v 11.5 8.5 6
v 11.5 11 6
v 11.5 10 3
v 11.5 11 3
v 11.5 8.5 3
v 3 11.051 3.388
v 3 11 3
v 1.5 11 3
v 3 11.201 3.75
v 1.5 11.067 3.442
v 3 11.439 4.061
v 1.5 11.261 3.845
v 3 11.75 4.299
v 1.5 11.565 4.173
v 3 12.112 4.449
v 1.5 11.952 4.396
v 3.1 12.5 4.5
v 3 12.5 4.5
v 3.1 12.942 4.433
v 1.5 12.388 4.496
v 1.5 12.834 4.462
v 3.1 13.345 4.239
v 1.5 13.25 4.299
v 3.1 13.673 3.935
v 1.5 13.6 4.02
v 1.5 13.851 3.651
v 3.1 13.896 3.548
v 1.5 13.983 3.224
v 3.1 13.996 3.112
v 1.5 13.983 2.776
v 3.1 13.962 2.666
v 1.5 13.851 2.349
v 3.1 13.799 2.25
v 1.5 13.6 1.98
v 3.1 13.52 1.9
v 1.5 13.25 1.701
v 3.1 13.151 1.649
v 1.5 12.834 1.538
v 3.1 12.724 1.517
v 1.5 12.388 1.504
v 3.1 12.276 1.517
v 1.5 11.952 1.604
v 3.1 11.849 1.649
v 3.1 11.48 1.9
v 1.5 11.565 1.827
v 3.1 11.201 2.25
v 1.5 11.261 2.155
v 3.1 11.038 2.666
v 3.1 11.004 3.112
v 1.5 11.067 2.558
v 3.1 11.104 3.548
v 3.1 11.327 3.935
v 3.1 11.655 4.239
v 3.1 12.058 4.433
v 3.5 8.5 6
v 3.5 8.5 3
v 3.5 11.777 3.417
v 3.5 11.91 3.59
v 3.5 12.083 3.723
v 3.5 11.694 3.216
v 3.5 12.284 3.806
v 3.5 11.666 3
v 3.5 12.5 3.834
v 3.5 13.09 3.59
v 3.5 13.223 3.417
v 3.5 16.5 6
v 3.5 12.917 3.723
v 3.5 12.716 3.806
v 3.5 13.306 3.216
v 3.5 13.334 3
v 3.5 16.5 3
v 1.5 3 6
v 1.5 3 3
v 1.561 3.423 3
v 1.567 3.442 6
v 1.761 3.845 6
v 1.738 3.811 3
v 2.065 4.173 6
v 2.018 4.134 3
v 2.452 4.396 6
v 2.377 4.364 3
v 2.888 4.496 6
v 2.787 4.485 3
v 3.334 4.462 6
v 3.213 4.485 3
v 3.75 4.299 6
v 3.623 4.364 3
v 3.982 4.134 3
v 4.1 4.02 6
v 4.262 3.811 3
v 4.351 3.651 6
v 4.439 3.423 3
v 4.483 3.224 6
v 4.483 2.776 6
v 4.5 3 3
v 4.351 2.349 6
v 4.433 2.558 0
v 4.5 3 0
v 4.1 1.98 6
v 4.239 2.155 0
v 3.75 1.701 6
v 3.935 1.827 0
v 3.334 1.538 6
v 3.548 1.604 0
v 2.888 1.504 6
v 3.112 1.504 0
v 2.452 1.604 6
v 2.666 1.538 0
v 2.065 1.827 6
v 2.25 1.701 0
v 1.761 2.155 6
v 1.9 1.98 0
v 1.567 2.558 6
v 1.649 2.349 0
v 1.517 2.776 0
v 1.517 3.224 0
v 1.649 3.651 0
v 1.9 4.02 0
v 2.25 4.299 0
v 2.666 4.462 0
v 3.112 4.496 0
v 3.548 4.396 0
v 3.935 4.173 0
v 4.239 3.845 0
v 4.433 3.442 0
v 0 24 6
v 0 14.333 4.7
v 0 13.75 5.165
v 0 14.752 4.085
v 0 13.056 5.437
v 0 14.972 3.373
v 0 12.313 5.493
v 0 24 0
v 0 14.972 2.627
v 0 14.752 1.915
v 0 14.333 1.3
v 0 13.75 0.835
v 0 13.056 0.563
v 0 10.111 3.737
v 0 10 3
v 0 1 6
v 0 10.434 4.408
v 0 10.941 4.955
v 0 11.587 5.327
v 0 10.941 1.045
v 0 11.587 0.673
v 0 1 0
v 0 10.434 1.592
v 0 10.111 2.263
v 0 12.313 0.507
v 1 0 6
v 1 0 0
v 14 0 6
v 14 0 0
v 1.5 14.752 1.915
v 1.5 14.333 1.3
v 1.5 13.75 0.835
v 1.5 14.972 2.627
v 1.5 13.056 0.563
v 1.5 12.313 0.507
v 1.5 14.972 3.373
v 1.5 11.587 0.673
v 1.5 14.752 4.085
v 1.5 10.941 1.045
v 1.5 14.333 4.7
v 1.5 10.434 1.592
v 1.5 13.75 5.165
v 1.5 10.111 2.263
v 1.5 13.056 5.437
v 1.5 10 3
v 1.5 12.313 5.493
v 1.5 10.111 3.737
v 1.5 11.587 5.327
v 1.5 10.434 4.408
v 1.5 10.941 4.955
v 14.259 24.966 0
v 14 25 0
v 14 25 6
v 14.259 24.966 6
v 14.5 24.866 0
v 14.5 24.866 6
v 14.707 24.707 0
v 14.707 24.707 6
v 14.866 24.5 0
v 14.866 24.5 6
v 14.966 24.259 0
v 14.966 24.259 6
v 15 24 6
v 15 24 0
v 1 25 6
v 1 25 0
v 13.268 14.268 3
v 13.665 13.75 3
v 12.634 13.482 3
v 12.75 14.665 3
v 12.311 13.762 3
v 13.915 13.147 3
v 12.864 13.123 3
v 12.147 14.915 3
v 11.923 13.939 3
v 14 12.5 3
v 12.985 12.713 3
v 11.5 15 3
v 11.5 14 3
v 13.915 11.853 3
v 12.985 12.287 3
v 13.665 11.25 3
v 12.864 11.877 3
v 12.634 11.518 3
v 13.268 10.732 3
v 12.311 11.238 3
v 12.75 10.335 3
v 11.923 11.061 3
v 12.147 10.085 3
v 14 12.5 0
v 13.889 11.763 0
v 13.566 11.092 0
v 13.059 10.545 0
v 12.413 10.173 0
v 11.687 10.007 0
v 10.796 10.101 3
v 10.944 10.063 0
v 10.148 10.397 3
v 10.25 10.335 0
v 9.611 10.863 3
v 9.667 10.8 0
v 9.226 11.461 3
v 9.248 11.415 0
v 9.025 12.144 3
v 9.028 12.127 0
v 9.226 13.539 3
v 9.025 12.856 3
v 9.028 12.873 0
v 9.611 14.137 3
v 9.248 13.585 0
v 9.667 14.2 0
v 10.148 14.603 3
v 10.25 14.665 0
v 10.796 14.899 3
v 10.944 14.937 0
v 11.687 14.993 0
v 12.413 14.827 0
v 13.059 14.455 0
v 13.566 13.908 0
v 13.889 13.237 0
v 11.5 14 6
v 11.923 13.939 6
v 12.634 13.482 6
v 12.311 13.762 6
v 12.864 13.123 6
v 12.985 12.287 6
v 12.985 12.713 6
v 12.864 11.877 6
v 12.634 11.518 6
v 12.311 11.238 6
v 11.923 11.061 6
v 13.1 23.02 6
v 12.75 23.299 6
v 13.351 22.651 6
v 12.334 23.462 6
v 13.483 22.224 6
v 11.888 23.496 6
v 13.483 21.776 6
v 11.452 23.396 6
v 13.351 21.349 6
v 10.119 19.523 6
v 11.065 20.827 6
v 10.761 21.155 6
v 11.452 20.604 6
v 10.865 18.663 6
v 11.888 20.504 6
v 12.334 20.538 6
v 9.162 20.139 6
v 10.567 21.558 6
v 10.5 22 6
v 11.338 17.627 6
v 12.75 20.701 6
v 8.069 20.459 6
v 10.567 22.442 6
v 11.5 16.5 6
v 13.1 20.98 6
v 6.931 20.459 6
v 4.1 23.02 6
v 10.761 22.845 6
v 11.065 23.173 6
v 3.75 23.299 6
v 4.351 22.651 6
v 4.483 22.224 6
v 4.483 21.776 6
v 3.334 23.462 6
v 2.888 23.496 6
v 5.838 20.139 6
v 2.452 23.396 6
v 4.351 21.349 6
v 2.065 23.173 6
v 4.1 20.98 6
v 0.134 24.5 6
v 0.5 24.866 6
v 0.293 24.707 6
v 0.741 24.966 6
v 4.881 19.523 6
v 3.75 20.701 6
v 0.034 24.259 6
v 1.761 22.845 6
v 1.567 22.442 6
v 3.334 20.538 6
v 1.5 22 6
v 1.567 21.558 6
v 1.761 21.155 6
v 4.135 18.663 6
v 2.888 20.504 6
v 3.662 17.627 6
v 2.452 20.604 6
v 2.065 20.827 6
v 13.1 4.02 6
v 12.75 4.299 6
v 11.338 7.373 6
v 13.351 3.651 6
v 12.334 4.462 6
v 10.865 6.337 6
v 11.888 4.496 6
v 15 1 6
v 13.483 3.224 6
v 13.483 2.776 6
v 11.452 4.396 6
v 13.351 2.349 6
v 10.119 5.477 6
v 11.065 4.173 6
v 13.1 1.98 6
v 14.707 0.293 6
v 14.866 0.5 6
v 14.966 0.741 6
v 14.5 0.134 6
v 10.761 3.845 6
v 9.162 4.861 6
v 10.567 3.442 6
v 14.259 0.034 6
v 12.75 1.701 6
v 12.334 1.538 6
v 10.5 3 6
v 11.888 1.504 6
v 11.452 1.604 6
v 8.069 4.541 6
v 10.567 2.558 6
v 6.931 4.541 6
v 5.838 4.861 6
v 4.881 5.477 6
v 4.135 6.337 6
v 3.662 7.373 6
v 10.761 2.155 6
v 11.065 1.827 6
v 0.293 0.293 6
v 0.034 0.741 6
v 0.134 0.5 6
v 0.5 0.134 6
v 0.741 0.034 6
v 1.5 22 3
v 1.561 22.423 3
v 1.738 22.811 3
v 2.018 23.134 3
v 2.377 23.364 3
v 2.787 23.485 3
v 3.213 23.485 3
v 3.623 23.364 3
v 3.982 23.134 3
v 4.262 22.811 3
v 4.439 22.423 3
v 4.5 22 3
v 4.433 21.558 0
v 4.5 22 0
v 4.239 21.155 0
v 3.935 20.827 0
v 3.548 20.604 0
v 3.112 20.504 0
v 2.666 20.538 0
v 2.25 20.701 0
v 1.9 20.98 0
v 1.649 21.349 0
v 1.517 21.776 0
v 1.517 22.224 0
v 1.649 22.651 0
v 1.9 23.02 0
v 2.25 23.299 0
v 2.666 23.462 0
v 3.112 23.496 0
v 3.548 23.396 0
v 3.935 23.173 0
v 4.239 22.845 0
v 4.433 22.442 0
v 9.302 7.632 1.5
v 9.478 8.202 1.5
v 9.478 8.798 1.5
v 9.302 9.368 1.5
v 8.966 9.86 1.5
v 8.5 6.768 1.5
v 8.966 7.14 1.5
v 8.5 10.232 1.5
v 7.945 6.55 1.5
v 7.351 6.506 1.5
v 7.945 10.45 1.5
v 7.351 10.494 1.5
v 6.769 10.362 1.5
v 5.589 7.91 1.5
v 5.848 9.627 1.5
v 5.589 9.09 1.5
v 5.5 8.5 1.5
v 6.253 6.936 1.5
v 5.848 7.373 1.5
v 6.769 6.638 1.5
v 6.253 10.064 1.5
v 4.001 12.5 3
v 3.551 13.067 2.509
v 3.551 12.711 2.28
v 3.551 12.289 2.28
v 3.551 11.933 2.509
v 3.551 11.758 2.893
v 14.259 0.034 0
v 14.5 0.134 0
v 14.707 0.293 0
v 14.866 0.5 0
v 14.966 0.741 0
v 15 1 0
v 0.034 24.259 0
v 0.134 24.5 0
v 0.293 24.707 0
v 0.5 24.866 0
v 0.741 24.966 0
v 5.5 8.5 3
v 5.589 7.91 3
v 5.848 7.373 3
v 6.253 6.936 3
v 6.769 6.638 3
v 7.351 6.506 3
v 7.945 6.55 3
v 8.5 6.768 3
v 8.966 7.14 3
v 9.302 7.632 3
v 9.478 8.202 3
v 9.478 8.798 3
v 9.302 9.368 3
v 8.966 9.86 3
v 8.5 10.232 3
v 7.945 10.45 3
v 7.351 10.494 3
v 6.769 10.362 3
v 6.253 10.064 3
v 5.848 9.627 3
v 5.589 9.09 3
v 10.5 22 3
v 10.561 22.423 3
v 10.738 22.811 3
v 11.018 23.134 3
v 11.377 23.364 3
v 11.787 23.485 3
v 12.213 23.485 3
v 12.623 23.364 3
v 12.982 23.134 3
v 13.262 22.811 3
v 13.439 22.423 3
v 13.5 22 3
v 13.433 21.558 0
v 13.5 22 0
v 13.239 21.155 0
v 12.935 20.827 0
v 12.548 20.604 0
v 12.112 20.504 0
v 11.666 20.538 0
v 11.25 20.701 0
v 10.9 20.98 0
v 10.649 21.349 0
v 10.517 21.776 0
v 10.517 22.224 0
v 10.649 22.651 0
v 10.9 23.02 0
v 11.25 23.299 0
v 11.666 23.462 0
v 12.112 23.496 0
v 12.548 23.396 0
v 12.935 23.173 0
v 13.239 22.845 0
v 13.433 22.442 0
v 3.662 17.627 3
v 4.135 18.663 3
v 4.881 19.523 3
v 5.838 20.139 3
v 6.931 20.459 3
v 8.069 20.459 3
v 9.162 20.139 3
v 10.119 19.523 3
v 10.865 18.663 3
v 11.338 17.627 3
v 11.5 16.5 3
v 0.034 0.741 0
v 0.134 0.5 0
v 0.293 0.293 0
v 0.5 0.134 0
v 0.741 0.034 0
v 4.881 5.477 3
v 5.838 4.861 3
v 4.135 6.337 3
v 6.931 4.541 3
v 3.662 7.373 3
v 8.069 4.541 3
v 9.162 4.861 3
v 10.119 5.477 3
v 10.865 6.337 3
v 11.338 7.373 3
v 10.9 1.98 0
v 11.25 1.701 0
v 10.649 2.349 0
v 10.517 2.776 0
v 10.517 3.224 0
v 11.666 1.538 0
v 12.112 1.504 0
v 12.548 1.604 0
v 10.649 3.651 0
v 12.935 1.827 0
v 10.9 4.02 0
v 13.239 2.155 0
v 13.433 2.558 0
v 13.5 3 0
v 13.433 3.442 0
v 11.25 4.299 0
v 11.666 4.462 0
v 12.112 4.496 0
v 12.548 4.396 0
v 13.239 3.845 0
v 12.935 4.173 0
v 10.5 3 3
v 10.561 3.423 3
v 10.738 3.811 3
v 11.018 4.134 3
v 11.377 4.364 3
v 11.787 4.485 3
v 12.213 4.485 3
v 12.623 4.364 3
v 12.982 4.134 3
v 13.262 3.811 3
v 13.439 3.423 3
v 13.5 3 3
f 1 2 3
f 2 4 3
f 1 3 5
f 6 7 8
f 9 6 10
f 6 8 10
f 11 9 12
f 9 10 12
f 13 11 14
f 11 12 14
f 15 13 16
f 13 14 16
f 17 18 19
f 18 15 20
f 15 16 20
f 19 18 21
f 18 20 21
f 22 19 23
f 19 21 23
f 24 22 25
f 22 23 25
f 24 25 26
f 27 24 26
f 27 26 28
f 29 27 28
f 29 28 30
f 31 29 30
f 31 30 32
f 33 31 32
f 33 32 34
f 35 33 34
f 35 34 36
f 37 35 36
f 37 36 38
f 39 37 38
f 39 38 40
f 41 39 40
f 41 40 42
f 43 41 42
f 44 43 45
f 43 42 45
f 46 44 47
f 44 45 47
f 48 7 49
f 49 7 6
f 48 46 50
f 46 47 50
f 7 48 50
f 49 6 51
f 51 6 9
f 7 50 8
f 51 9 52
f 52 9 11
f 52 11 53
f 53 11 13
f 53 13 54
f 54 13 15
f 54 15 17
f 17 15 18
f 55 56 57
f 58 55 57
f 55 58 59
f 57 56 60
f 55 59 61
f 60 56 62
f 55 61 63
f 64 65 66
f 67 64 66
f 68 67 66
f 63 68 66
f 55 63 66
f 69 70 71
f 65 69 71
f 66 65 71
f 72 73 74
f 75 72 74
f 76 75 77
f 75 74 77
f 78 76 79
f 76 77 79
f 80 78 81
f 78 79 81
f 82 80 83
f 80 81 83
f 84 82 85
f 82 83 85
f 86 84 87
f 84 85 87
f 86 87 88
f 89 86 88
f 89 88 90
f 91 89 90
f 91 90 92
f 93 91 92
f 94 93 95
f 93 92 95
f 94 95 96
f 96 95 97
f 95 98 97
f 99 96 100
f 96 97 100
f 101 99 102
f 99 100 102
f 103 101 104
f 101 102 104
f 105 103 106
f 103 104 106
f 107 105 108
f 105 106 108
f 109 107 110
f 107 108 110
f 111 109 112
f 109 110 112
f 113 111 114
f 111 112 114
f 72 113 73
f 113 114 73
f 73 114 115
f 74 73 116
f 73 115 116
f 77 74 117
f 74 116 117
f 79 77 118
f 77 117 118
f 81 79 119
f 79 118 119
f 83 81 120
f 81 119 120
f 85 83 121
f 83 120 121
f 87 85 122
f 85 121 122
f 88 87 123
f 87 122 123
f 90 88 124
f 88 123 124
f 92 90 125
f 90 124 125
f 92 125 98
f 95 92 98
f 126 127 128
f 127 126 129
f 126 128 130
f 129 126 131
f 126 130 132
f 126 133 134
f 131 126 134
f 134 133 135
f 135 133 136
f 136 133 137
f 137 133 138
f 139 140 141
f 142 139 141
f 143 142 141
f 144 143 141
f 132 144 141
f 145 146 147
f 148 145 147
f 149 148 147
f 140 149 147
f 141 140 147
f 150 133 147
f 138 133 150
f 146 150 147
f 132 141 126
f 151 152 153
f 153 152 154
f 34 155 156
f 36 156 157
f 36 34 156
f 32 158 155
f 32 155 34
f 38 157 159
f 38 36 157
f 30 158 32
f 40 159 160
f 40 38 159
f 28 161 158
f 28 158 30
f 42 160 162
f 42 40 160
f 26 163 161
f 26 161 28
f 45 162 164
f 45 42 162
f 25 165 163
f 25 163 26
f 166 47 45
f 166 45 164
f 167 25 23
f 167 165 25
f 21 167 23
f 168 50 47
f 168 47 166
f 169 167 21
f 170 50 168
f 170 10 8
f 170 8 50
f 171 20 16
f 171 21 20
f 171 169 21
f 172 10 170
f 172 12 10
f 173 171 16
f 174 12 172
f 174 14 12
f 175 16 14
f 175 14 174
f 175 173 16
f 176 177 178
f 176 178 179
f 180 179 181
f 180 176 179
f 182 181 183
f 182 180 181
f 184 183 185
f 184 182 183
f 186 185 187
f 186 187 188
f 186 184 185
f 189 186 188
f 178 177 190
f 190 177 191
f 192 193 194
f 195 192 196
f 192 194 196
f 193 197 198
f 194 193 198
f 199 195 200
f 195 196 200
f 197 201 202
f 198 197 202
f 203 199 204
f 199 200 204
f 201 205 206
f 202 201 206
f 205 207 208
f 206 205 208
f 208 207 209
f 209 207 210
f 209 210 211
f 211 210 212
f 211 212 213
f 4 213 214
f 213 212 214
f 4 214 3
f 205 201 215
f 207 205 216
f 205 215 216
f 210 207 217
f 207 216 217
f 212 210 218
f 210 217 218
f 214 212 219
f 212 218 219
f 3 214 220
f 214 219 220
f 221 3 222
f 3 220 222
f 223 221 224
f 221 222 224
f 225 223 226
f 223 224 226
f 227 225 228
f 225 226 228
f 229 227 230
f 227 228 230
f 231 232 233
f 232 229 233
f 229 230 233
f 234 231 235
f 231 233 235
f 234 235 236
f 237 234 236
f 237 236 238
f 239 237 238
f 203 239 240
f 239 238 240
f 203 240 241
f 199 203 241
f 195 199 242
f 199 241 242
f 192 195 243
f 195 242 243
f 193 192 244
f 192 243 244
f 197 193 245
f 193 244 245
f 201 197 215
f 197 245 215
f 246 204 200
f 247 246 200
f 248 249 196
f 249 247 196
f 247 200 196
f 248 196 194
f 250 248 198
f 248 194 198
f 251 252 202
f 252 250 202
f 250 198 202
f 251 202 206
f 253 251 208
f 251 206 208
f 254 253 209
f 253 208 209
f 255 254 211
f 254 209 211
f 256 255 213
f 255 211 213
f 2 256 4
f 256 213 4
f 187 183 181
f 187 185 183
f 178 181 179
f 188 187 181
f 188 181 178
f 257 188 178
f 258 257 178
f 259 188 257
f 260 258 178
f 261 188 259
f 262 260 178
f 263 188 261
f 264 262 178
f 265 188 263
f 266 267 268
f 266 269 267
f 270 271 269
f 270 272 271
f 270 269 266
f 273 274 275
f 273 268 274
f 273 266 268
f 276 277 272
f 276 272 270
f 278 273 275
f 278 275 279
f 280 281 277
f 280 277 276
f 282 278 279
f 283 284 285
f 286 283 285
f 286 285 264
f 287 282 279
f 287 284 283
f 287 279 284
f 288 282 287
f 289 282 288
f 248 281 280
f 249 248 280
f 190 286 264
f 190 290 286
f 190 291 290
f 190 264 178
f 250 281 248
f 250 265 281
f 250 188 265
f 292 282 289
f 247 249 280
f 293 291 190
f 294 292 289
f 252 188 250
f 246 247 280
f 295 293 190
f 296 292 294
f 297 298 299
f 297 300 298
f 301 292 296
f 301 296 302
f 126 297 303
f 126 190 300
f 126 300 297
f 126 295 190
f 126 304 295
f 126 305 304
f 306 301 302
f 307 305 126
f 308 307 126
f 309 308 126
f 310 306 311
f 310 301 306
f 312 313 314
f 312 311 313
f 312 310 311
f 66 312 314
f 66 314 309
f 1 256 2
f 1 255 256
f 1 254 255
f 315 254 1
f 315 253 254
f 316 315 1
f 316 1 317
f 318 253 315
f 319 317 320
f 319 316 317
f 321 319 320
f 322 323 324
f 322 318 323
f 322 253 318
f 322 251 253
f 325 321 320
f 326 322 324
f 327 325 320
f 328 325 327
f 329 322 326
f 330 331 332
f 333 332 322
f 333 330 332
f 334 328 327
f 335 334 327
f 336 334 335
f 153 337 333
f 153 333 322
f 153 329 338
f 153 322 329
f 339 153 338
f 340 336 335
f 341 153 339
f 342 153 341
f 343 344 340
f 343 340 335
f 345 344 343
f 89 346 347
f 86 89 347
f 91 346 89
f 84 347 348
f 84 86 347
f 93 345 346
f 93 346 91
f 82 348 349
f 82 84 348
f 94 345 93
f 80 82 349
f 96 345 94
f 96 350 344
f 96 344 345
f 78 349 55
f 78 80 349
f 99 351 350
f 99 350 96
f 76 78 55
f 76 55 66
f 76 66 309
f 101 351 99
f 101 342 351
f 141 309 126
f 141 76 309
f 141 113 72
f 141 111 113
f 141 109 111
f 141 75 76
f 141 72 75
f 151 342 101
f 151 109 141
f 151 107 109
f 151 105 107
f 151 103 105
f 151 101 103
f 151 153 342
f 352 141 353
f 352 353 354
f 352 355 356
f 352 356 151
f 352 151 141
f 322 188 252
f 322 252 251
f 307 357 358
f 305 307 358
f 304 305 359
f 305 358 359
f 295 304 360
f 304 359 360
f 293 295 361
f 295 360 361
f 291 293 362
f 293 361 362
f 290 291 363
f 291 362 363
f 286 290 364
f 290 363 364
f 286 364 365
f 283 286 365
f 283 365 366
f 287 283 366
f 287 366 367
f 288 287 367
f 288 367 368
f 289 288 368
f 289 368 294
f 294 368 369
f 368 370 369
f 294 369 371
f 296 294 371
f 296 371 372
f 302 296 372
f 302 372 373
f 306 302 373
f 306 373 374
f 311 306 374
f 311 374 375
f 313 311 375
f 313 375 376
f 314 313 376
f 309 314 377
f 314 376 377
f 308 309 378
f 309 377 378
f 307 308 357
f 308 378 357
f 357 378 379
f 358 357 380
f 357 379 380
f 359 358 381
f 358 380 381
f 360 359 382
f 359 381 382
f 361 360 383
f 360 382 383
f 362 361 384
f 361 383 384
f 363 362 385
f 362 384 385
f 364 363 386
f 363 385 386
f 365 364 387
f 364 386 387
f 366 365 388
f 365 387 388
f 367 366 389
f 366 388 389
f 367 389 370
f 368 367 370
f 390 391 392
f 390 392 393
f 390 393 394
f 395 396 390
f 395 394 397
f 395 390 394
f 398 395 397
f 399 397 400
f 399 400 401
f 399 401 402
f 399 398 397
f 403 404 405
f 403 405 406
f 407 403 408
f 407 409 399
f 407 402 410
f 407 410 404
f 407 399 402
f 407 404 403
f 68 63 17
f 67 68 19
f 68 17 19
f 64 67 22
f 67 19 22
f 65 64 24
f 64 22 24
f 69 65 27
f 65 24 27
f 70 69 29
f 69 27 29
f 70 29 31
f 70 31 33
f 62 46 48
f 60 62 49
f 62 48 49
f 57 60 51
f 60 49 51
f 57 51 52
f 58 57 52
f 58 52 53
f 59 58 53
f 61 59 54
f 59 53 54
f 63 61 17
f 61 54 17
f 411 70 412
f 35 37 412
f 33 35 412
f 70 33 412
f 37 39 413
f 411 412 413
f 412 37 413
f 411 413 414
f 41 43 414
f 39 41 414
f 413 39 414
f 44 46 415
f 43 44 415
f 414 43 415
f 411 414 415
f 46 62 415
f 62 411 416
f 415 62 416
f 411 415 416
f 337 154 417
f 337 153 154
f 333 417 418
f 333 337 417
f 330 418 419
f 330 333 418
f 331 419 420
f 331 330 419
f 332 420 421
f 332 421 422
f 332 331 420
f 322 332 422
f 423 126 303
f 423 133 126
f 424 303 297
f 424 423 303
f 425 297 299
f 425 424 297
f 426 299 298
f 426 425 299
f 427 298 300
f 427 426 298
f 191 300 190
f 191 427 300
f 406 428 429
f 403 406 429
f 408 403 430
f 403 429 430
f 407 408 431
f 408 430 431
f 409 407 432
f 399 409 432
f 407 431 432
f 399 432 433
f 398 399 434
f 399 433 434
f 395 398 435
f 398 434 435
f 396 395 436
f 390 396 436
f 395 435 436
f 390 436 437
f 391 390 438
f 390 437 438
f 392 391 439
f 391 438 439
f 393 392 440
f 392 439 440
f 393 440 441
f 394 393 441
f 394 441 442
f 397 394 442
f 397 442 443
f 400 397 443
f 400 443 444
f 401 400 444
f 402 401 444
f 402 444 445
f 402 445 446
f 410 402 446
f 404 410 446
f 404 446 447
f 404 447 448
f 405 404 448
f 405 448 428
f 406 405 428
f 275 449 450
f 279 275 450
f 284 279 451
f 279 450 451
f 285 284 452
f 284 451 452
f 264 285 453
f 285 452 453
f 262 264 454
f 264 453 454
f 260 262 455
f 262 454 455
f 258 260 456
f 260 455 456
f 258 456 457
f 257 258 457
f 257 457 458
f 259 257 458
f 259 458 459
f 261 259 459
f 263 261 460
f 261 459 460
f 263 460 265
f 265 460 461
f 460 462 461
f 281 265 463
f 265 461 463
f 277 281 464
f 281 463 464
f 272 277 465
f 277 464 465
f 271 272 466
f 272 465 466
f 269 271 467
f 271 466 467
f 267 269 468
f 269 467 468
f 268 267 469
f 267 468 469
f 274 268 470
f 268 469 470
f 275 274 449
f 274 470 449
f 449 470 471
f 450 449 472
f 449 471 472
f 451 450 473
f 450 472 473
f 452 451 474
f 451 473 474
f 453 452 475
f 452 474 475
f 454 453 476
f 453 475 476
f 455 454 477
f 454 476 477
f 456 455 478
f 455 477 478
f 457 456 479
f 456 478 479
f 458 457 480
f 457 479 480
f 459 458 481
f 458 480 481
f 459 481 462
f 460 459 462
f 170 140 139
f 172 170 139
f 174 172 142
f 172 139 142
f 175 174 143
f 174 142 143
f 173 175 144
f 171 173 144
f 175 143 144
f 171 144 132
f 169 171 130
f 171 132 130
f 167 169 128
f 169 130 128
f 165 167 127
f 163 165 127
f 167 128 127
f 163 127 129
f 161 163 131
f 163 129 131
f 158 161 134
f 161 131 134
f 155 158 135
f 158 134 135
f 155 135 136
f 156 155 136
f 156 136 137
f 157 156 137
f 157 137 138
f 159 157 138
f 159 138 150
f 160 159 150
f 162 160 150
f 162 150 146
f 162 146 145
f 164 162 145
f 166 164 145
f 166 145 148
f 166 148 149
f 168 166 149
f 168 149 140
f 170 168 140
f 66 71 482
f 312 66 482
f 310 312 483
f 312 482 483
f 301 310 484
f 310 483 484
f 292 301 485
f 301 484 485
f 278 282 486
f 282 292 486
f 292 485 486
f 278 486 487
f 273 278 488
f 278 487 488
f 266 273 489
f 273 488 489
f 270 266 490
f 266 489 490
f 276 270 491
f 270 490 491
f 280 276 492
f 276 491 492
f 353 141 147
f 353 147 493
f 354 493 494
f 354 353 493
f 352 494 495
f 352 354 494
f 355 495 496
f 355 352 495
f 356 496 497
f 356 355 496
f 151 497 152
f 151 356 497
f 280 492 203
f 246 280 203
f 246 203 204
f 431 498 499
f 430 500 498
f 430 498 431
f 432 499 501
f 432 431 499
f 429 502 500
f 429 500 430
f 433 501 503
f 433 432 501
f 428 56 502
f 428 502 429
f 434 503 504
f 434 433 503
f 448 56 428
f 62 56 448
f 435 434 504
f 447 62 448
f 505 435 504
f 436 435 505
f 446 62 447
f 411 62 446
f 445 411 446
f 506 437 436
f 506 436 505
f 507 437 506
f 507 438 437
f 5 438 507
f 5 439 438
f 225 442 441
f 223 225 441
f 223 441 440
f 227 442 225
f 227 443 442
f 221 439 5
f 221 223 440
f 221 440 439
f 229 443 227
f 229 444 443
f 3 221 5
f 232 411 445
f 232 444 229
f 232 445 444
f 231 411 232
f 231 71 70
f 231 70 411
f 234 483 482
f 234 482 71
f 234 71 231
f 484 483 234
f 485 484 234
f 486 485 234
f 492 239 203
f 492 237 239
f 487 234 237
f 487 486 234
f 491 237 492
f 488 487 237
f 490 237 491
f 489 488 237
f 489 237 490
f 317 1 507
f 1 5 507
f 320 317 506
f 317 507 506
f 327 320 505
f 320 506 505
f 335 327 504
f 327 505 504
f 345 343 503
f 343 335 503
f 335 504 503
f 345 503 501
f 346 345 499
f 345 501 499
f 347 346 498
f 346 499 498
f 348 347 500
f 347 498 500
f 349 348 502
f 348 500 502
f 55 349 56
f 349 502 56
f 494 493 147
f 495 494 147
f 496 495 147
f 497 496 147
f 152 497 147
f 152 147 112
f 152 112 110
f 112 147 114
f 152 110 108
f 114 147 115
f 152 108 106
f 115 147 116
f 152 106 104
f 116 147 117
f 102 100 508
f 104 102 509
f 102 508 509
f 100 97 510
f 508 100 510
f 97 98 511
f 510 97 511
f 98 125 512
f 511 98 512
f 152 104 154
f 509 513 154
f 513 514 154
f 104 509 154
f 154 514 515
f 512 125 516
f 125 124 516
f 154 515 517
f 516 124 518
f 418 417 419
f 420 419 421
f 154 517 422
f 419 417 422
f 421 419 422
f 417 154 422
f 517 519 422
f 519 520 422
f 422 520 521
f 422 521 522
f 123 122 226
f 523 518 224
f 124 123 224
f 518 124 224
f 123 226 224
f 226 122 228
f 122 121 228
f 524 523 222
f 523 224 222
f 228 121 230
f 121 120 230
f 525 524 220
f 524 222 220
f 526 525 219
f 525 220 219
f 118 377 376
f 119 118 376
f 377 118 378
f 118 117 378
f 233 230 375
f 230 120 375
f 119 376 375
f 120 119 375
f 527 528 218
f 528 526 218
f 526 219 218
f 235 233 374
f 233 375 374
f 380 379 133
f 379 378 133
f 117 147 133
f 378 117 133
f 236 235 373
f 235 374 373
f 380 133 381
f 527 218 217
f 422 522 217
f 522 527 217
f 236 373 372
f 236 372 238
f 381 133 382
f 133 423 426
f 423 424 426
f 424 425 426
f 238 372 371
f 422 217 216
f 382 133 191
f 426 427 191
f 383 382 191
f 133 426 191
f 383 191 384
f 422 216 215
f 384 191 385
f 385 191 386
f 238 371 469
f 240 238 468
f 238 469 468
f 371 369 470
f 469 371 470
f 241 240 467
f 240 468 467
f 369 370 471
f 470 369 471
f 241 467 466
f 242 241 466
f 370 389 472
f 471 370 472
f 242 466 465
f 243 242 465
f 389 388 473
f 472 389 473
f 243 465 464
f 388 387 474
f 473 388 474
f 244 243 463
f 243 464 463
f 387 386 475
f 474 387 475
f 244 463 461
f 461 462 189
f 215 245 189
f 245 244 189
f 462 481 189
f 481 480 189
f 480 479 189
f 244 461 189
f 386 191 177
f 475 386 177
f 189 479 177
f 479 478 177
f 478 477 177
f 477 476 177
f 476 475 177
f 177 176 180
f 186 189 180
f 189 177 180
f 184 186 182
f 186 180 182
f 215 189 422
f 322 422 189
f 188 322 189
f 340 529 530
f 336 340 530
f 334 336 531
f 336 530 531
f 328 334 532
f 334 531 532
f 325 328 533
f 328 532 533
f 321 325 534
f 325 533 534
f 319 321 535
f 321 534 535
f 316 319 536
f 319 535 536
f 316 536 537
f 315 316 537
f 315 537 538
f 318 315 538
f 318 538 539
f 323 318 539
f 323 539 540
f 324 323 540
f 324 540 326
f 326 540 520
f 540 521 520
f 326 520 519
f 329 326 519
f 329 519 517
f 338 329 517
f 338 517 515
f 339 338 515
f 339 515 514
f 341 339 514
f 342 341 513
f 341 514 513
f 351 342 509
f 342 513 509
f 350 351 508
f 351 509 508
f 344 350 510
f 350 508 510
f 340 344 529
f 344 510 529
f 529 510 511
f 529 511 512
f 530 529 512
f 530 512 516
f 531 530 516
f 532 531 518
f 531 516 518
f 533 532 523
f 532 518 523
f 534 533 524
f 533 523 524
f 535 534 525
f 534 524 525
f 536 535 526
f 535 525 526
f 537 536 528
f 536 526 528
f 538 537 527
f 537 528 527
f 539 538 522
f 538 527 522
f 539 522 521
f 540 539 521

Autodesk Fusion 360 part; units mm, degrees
sketch "Sketch1" plane through (0, 0, 0) normal (0, 0, 1) x (1, 0, 0)
  line L0 (0, 0) -> (15, 0)
  line L1 (15, 0) -> (15, 25)
  line L2 (15, 25) -> (0, 25)
  line L3 (0, 25) -> (0, 0)
  circle A0 centre (3, 22) radius 1.5
  circle A1 centre (12, 3) radius 1.5
  circle A2 centre (12, 22) radius 1.5
  circle A3 centre (3, 3) radius 1.5
  line L4 (7.5, 25) -> (7.5, 0) construction
  line L5 (7.5, 12.5) -> (11.5, 12.5) construction
  circle A4 centre (11.5, 12.5) radius 2.5
  dimension "d11" = 15
  dimension "d12" = 25
  dimension "d13" = 3
  dimension "d14" = 3
  dimension "d15" = 3
  dimension "d16" = 3
  dimension "d17" = 3
  dimension "d18" = 3
  dimension "d19" = 3
  dimension "d20" = 3
  dimension "d21" = 3
  dimension "d22" = 3
  dimension "d23" = 3
  dimension "d24" = 3
  dimension "d27" = 4
  dimension "d28" = 5
extrude "Extrude1" add sketch "Sketch1" along normal blind 3
sketch "Sketch2" plane through (0, 0, 3) normal (0, 0, 1) x (-1, 0, 0)
  circle A0 centre (-12, -22) radius 1.5
  circle A1 centre (-12, -3) radius 1.5
  circle A2 centre (-3, -22) radius 1.5
  circle A3 centre (-3, -3) radius 1.5
  circle A4 centre (-11.5, -12.5) radius 2.5
  line L0 (0, -25) -> (0, 0)
  line L1 (0, 0) -> (-15, 0)
  line L2 (-15, 0) -> (-15, -25)
  line L3 (-15, -25) -> (0, -25)
  circle A5 centre (-3, -22) radius 1.5
  circle A6 centre (-12, -22) radius 1.5
  circle A7 centre (-12, -3) radius 1.5
  circle A8 centre (-3, -3) radius 1.5
  line L4 (-7.5, -25) -> (-7.5, 0) construction
  line L5 (0, -12.5) -> (-15, -12.5) construction
  line L6 (-11.5, -16.5) -> (-11.5, -8.5)
  line L7 (-3.5, -8.5) -> (-3.5, -16.5)
  arc A9 (-11.5, -16.5) -> (-3.5, -16.5) centre (-7.5, -16.5) ccw
  arc A10 (-3.5, -8.5) -> (-11.5, -8.5) centre (-7.5, -8.5) ccw
  line L8 (-11.5, -12.5) -> (-3.5, -12.5) construction
  arc A11 (-11.5, -11) -> (-11.5, -14) centre (-11.5, -12.5) ccw
  circle A12 centre (-7.5, -8.5) radius 2
  dimension "d31" = 3
  dimension "d32" = 3
  dimension "d33" = 3
  dimension "d34" = 3
  dimension "d35" = 8
  dimension "d36" = 8
  dimension "d37" = 8
  dimension "d39" = 3
  dimension "d40" = 4
extrude "Extrude2" add sketch "Sketch2" along normal blind 3 contours A4 L6 A11 | L0 L1 L2 L3
extrude "Extrude3" cut sketch "Sketch2" against normal blind 1.5 contours A12
fillet "Fillet1" radius 1 4 edges at (15, 0, 3) (0, 0, 3) (0, 25, 3) (15, 25, 3)
sketch "Sketch3" plane through (0, 0, 0) normal (-1, 0, 0) x (0, -1, 0)
  line L0 (-24, 6) -> (-24, 0)
  line L1 (-24, 0) -> (-1, 0)
  line L2 (-1, 0) -> (-1, 6)
  line L3 (-1, 6) -> (-24, 6)
  line L4 (-25, 0) -> (-25, 6)
  line L5 (0, 0) -> (0, 6)
  line L6 (-25, 3) -> (0, 3) construction
  line L7 (-12.5, 6) -> (-12.5, 0) construction
  circle A0 centre (-12.5, 3) radius 2.5
  circle A1 centre (-12.5, 3) radius 1.5
  point P0 (-12.5, 0)
  dimension "d50" = 5
  dimension "d51" = 3
extrude "Extrude4" cut sketch "Sketch3" against normal blind 1.5 contours A0
extrude "Extrude5" cut sketch "Sketch3" against normal blind 3 contours A1
hole "Hole1" at (3, 12.5, 3) direction (1, 0, 0) diameter 3 depth 0.1 tip angle 118
equation "outer_filet_radius = 1 mm"
equation "mount_hole_diameter = 3 mm"
equation "mount_hole_length_inset = 3 mm"
equation "mount_hole_width_inset = 3 mm"
equation "bottom_thru_hole_diameter = 5 mm"
equation "bottom_plate_depth = 3 mm"
equation "bottom_plate_partial_hole_radius = 4 mm"
equation "bottom_plate_partial_hole_depth = 4.5 mm"
equation "width = 15 mm"
equation "length = 25 mm"
equation "d11 = width"
equation "d12 = length"
equation "d13 = mount_hole_diameter"
equation "d14 = mount_hole_diameter"
equation "d15 = mount_hole_diameter"
equation "d16 = mount_hole_diameter"
equation "d17 = mount_hole_width_inset"
equation "d18 = mount_hole_width_inset"
equation "d19 = mount_hole_width_inset"
equation "d20 = mount_hole_width_inset"
equation "d21 = mount_hole_length_inset"
equation "d22 = mount_hole_length_inset"
equation "d23 = mount_hole_length_inset"
equation "d24 = mount_hole_length_inset"
equation "slot_radius = 4 mm"
equation "slot_length = 16 mm"
equation "d27 = slot_radius"
equation "d28 = bottom_thru_hole_diameter"
equation "d29 = bottom_plate_depth"
equation "d31 = mount_hole_diameter"
equation "d32 = mount_hole_diameter"
equation "d33 = mount_hole_diameter"
equation "d34 = mount_hole_diameter"
equation "d35 = slot_radius * 2"
equation "d36 = slot_radius * 2"
equation "d37 = slot_length - ( slot_radius * 2 )"
equation "slotted_circle_diameter = 3 mm"
equation "d39 = slotted_circle_diameter"
equation "d40 = bottom_plate_partial_hole_radius"
equation "top_plate_thickness = 3 mm"
equation "d42 = top_plate_thickness"
equation "d44 = top_plate_thickness - bottom_plate_partial_hole_depth"
equation "d47 = outer_filet_radius"
equation "outer_side_hole_diameter = 5 mm"
equation "inner_side_hole_diameter = 3 mm"
equation "d50 = outer_side_hole_diameter"
equation "d51 = inner_side_hole_diameter"
equation "outer_side_hole_depth = 1.5 mm"
equation "inner_side_hole_depth = 3 mm"
equation "d54 = -outer_side_hole_depth"
equation "d56 = -inner_side_hole_depth"
